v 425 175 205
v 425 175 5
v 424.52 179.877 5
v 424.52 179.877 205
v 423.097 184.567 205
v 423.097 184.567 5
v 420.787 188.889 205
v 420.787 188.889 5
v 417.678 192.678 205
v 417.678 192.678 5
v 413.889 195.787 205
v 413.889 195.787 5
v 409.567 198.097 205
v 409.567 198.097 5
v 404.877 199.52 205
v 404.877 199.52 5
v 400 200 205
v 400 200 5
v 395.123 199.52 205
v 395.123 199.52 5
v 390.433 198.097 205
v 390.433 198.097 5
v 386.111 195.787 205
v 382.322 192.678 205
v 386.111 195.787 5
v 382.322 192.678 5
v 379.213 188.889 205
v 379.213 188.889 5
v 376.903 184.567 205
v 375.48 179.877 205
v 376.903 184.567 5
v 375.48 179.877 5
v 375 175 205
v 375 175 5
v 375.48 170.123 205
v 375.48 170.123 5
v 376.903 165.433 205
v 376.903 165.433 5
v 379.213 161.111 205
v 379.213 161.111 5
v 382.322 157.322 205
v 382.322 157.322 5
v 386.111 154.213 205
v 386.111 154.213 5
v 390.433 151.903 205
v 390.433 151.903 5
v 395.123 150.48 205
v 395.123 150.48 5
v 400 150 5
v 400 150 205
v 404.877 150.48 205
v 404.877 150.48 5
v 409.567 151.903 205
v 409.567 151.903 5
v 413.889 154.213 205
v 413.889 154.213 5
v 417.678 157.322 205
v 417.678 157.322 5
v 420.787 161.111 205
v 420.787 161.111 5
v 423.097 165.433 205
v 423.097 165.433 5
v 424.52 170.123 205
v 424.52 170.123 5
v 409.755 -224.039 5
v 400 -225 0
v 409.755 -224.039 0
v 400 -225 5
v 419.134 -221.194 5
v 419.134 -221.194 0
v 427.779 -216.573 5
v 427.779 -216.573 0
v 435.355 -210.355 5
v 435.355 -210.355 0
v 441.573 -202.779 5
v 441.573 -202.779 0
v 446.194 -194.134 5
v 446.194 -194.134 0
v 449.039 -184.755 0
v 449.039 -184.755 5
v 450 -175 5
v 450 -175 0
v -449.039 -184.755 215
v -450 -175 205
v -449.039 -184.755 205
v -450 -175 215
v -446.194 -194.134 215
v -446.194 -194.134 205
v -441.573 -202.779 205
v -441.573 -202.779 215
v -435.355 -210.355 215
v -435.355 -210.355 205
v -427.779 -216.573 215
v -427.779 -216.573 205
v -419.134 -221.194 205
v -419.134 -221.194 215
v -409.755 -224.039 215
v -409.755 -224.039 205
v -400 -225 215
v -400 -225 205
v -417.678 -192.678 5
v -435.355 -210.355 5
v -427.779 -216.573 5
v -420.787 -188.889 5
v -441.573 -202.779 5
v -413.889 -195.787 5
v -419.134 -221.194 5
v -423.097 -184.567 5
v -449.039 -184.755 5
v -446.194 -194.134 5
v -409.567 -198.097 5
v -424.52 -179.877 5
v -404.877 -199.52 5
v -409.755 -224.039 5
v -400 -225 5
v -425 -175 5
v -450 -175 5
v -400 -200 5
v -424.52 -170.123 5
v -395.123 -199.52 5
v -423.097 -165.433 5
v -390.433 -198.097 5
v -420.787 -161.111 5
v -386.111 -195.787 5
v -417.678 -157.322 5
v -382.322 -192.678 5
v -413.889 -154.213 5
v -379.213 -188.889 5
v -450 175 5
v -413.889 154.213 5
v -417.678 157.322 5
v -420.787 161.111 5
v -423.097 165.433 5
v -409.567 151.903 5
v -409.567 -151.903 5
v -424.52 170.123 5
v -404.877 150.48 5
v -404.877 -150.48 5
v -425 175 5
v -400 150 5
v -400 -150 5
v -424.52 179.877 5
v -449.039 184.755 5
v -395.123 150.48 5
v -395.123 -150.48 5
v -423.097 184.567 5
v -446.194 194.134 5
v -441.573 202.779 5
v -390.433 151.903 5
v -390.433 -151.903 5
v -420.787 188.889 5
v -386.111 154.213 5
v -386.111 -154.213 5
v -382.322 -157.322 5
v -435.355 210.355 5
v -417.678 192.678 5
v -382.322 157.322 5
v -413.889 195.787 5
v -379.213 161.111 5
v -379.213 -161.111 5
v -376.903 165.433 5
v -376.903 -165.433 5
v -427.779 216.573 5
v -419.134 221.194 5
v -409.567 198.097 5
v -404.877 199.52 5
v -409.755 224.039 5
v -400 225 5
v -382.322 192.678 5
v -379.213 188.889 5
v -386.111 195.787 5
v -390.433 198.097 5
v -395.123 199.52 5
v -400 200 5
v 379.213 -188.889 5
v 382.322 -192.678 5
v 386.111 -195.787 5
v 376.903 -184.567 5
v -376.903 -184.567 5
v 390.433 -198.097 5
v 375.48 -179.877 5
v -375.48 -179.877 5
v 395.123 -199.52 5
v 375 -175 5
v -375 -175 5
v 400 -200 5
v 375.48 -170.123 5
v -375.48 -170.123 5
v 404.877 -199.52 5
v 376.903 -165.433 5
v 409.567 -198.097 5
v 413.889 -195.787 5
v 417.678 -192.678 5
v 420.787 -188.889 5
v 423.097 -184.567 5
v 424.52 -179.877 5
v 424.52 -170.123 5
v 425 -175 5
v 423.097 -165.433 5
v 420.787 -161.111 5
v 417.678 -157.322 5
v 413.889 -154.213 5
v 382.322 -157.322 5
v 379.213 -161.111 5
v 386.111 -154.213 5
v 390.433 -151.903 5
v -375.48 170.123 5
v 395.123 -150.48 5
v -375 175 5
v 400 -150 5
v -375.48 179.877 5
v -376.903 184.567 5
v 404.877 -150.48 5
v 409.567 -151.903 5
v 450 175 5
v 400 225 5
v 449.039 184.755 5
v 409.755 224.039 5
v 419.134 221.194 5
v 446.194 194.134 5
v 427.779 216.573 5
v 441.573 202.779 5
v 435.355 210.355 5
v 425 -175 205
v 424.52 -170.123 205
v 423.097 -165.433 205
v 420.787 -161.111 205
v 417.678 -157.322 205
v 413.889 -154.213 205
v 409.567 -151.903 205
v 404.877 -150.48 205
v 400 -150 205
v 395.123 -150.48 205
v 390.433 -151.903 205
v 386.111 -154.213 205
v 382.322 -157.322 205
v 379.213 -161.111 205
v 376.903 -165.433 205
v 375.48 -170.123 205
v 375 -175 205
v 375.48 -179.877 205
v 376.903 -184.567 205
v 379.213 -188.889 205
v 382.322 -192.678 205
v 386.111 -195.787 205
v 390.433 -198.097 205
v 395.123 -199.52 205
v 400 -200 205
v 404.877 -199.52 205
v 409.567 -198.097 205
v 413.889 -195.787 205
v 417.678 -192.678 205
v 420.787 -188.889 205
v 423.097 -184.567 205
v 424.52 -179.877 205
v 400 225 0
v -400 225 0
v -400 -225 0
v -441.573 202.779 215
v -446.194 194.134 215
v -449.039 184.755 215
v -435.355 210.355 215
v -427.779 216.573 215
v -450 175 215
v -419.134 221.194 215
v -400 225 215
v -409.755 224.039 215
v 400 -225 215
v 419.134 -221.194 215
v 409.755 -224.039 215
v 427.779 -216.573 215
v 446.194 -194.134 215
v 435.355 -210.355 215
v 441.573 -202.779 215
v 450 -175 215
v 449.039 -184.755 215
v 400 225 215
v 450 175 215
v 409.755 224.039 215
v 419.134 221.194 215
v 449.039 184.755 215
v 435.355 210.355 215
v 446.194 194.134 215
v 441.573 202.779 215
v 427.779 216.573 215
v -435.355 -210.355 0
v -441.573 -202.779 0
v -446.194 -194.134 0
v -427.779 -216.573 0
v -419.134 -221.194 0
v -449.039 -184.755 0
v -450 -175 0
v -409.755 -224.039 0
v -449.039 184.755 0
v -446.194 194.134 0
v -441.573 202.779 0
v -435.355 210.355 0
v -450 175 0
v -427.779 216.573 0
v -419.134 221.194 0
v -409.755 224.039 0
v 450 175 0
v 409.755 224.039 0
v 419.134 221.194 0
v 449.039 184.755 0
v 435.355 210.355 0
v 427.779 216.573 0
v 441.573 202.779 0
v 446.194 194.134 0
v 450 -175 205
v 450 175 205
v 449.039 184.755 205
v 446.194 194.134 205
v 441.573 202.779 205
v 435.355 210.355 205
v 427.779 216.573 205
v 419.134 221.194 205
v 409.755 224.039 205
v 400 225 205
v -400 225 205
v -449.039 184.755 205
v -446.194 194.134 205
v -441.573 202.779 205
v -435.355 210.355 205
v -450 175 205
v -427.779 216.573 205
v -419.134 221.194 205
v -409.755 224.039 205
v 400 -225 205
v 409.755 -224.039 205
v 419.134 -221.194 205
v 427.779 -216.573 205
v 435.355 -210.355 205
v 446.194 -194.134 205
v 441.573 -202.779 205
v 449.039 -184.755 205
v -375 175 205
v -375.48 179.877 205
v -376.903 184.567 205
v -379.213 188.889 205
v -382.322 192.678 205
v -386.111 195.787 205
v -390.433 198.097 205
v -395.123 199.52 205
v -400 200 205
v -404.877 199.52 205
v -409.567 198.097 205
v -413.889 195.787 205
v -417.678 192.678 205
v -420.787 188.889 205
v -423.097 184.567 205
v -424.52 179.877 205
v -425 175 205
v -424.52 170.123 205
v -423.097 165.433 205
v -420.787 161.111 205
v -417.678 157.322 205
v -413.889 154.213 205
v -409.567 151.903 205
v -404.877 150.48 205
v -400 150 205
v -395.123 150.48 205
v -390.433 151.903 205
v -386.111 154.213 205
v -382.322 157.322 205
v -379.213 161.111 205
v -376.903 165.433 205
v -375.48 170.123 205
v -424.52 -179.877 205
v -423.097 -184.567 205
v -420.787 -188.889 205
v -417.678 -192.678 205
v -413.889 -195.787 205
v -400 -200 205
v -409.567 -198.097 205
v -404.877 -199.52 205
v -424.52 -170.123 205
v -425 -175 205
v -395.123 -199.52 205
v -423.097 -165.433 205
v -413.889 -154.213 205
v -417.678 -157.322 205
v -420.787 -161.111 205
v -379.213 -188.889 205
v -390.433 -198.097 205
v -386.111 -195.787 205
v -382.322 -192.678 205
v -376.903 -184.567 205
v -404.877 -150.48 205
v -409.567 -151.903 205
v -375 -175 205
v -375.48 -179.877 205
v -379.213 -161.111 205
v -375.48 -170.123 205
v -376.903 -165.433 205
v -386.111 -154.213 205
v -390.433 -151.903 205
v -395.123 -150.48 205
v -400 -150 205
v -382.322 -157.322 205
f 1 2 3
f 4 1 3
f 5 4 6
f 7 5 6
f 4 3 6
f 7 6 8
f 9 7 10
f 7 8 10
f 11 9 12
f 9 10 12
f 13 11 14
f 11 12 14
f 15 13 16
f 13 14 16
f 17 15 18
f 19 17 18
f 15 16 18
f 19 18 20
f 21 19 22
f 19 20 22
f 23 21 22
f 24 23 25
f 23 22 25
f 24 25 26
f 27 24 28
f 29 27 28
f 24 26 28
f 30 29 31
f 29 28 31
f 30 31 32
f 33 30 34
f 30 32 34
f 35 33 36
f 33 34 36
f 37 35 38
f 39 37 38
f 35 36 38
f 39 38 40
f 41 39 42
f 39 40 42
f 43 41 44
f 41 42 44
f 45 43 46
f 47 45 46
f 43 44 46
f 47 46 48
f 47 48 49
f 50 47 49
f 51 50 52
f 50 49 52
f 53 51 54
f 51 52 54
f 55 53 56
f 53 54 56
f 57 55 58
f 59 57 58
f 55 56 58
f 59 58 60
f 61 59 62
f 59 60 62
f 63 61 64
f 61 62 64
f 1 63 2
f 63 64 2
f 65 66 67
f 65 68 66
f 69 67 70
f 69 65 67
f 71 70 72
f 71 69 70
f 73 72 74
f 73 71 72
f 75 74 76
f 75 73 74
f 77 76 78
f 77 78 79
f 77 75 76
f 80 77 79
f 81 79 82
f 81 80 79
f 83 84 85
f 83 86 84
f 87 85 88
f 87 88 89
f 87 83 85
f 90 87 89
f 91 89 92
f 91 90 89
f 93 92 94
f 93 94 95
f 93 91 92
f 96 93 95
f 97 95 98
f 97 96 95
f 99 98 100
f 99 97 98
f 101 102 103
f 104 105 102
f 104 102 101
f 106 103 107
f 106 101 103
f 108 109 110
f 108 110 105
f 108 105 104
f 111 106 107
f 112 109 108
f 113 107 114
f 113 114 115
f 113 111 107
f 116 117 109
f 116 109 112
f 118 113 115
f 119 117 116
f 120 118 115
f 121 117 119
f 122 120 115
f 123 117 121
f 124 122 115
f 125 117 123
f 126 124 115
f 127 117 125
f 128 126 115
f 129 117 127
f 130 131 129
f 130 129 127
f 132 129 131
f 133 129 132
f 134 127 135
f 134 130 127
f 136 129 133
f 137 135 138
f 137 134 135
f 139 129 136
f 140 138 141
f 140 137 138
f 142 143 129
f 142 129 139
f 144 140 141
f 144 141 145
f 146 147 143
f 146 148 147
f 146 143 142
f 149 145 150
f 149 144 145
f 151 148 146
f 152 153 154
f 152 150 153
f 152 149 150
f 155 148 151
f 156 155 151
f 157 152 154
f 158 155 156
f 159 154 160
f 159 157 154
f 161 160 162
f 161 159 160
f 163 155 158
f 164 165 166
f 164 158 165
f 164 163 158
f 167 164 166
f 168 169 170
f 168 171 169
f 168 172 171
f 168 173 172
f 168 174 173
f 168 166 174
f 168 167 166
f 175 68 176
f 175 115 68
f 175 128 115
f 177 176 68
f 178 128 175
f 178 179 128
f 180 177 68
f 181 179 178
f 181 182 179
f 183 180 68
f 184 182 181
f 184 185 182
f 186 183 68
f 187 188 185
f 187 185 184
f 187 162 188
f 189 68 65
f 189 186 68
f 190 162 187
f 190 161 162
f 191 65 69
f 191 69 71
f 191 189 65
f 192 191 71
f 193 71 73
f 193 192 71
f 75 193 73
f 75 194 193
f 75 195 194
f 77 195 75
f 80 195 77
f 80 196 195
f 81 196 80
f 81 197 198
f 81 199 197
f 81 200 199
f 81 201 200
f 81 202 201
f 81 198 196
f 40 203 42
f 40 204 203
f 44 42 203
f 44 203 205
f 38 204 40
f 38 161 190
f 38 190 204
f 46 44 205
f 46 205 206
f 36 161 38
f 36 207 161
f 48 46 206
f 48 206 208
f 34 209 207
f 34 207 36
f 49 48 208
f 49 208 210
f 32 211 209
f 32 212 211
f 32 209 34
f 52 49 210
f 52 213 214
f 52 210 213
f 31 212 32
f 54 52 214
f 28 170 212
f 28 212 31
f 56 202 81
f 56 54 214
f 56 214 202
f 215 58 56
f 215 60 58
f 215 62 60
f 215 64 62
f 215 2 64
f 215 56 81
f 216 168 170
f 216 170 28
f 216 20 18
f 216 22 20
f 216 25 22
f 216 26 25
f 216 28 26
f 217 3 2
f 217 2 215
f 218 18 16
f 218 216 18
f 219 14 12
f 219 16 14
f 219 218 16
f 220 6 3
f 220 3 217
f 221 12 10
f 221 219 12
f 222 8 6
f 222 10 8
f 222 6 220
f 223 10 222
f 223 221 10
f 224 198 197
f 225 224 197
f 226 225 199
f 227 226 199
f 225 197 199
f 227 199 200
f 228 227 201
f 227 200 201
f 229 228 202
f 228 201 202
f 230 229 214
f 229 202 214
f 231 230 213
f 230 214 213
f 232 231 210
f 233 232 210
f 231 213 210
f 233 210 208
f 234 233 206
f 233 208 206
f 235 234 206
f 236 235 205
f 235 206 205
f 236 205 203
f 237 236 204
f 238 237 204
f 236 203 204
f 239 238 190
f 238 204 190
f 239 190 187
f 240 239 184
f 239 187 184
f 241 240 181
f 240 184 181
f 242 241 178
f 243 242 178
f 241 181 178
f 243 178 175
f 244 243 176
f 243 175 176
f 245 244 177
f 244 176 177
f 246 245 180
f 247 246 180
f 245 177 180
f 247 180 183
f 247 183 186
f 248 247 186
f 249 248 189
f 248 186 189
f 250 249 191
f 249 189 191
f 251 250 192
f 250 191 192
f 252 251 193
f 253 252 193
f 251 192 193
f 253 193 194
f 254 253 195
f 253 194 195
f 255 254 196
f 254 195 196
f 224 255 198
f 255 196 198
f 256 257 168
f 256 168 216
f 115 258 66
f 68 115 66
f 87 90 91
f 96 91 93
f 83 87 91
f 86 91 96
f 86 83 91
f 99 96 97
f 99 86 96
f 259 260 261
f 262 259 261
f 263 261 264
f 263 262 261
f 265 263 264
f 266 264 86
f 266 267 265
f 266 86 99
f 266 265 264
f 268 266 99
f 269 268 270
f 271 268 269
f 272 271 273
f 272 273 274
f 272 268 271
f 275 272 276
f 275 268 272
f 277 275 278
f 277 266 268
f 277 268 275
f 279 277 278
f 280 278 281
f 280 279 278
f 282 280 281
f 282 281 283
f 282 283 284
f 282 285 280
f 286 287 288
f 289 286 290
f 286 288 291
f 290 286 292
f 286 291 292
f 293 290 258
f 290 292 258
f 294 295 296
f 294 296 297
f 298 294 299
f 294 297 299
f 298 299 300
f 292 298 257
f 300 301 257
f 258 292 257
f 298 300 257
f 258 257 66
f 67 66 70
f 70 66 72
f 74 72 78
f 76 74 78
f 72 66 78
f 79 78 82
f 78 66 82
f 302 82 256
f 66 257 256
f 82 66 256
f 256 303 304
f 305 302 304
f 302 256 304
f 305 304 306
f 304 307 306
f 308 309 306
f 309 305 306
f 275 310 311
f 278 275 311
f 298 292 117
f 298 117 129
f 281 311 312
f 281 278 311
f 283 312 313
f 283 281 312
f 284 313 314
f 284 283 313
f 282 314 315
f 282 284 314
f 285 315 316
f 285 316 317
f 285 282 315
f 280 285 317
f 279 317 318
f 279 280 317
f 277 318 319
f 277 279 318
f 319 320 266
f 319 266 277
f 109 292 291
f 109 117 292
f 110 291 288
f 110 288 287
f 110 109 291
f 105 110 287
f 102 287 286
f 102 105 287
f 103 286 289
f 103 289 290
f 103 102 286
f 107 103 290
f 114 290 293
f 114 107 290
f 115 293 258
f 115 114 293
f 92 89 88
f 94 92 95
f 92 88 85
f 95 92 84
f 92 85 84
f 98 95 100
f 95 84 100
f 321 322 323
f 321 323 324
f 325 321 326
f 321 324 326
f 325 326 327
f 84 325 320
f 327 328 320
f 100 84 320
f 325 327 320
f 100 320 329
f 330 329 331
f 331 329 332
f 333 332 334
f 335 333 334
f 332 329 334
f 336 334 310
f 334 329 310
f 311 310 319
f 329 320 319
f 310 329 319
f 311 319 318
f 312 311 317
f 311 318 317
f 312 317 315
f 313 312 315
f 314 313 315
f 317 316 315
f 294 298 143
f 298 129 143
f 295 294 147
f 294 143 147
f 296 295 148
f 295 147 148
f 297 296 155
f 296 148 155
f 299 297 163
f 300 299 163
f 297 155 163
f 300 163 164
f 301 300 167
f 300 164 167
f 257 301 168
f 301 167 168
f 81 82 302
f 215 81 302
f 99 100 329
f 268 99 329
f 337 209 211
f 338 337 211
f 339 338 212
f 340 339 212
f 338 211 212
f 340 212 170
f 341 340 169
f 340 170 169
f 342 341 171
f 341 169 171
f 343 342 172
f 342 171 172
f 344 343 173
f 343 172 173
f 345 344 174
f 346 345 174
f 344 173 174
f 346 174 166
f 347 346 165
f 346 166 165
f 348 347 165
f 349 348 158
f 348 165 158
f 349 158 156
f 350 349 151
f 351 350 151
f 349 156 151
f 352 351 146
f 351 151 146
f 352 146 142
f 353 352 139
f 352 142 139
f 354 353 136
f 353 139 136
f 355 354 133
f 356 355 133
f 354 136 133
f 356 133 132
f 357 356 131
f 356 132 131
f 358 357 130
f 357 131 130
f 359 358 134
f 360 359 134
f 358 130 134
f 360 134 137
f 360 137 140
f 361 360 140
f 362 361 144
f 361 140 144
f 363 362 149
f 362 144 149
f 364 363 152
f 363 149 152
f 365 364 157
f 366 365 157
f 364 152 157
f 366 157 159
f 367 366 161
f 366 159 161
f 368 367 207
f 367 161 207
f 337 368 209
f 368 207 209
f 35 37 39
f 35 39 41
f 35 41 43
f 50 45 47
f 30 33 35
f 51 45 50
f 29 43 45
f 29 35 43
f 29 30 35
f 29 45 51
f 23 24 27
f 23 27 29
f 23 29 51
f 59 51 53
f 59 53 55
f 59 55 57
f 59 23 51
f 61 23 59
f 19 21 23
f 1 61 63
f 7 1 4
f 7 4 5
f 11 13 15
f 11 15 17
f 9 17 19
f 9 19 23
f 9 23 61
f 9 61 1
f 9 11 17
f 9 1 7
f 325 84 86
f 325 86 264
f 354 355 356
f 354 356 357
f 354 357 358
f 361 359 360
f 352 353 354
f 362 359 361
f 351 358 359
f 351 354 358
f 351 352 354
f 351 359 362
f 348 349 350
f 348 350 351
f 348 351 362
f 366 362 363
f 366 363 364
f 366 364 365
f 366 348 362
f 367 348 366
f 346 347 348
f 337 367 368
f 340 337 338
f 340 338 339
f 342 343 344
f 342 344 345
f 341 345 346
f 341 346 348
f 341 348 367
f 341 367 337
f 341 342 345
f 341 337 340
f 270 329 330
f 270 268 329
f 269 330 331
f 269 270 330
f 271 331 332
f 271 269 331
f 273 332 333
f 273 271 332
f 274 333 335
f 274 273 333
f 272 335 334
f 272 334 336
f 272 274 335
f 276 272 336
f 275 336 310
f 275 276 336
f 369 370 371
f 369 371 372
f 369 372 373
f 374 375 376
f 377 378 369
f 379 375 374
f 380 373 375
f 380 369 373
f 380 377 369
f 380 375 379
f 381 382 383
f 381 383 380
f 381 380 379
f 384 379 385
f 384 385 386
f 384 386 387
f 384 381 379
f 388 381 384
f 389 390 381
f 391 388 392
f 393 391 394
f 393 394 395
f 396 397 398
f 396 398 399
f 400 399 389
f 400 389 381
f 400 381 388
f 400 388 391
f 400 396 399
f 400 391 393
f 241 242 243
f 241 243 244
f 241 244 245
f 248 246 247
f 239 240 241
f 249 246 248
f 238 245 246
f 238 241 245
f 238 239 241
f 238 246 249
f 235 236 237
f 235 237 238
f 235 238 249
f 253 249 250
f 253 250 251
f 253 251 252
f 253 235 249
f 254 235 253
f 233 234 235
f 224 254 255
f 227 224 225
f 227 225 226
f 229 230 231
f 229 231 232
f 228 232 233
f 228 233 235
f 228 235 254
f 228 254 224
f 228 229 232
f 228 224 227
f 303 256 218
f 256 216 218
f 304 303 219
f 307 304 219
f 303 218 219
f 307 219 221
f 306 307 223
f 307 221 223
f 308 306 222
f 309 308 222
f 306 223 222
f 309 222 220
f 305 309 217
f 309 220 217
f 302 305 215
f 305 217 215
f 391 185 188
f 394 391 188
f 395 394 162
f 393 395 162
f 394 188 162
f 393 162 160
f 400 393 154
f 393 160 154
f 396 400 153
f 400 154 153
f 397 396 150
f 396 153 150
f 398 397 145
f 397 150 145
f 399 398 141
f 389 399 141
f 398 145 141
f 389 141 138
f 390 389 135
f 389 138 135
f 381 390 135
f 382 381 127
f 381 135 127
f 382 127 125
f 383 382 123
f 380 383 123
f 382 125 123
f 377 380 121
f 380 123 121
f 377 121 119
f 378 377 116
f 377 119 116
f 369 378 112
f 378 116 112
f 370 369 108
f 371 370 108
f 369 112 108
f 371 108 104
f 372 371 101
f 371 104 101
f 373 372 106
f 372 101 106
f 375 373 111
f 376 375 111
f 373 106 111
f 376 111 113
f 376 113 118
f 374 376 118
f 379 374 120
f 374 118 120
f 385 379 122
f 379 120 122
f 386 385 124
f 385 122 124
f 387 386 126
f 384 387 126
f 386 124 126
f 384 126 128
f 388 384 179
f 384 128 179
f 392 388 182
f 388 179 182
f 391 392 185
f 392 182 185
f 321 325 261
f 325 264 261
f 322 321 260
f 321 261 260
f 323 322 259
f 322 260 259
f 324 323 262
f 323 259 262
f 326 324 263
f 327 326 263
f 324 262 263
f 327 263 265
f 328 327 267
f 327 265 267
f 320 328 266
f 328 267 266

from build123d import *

# Parameters (mm, degrees)
F0_W     = 900
F0_H     = 450
F1_DEPTH = 5
F2_R     = 25
F3_DEPTH = 200
F4_W     = 900
F4_H     = 450
F5_DEPTH = 10
F6_R     = 50
F6_2_R   = 50


with BuildPart() as f1:
    # F0 (on Top) → F1 (new body)
    with BuildSketch(Plane.XY):
        Rectangle(F0_W, F0_H)
    extrude(amount=F1_DEPTH)

    # F2 (on face) → F3 (join)
    with BuildSketch(Plane.XY.offset(5)):
        with Locations((-400, 175)):
            Circle(F2_R)
        with Locations((400, 175)):
            Circle(F2_R)
        with Locations((-400, -175)):
            Circle(F2_R)
        with Locations((400, -175)):
            Circle(F2_R)
    extrude(amount=F3_DEPTH)

    # F6
    f6_edges = [f1.edges().sort_by_distance(p)[0] for p in [
        (-450, -225, 2.5),
        (450, -225, 2.5),
        (450, 225, 2.5),
        (-450, 225, 2.5),
    ]]
    fillet(f6_edges, radius=F6_R)


with BuildPart() as f5:
    # F4 (on face) → F5 (new body)
    with BuildSketch(Plane.XY.offset(205)):
        Rectangle(F4_W, F4_H)
    extrude(amount=F5_DEPTH)

    # F6#2
    f6_2_edges = [f5.edges().sort_by_distance(p)[0] for p in [
        (-450, -225, 210),
        (450, -225, 210),
        (450, 225, 210),
        (-450, 225, 210),
    ]]
    fillet(f6_2_edges, radius=F6_2_R)


solid = Compound([f1.part, f5.part])
